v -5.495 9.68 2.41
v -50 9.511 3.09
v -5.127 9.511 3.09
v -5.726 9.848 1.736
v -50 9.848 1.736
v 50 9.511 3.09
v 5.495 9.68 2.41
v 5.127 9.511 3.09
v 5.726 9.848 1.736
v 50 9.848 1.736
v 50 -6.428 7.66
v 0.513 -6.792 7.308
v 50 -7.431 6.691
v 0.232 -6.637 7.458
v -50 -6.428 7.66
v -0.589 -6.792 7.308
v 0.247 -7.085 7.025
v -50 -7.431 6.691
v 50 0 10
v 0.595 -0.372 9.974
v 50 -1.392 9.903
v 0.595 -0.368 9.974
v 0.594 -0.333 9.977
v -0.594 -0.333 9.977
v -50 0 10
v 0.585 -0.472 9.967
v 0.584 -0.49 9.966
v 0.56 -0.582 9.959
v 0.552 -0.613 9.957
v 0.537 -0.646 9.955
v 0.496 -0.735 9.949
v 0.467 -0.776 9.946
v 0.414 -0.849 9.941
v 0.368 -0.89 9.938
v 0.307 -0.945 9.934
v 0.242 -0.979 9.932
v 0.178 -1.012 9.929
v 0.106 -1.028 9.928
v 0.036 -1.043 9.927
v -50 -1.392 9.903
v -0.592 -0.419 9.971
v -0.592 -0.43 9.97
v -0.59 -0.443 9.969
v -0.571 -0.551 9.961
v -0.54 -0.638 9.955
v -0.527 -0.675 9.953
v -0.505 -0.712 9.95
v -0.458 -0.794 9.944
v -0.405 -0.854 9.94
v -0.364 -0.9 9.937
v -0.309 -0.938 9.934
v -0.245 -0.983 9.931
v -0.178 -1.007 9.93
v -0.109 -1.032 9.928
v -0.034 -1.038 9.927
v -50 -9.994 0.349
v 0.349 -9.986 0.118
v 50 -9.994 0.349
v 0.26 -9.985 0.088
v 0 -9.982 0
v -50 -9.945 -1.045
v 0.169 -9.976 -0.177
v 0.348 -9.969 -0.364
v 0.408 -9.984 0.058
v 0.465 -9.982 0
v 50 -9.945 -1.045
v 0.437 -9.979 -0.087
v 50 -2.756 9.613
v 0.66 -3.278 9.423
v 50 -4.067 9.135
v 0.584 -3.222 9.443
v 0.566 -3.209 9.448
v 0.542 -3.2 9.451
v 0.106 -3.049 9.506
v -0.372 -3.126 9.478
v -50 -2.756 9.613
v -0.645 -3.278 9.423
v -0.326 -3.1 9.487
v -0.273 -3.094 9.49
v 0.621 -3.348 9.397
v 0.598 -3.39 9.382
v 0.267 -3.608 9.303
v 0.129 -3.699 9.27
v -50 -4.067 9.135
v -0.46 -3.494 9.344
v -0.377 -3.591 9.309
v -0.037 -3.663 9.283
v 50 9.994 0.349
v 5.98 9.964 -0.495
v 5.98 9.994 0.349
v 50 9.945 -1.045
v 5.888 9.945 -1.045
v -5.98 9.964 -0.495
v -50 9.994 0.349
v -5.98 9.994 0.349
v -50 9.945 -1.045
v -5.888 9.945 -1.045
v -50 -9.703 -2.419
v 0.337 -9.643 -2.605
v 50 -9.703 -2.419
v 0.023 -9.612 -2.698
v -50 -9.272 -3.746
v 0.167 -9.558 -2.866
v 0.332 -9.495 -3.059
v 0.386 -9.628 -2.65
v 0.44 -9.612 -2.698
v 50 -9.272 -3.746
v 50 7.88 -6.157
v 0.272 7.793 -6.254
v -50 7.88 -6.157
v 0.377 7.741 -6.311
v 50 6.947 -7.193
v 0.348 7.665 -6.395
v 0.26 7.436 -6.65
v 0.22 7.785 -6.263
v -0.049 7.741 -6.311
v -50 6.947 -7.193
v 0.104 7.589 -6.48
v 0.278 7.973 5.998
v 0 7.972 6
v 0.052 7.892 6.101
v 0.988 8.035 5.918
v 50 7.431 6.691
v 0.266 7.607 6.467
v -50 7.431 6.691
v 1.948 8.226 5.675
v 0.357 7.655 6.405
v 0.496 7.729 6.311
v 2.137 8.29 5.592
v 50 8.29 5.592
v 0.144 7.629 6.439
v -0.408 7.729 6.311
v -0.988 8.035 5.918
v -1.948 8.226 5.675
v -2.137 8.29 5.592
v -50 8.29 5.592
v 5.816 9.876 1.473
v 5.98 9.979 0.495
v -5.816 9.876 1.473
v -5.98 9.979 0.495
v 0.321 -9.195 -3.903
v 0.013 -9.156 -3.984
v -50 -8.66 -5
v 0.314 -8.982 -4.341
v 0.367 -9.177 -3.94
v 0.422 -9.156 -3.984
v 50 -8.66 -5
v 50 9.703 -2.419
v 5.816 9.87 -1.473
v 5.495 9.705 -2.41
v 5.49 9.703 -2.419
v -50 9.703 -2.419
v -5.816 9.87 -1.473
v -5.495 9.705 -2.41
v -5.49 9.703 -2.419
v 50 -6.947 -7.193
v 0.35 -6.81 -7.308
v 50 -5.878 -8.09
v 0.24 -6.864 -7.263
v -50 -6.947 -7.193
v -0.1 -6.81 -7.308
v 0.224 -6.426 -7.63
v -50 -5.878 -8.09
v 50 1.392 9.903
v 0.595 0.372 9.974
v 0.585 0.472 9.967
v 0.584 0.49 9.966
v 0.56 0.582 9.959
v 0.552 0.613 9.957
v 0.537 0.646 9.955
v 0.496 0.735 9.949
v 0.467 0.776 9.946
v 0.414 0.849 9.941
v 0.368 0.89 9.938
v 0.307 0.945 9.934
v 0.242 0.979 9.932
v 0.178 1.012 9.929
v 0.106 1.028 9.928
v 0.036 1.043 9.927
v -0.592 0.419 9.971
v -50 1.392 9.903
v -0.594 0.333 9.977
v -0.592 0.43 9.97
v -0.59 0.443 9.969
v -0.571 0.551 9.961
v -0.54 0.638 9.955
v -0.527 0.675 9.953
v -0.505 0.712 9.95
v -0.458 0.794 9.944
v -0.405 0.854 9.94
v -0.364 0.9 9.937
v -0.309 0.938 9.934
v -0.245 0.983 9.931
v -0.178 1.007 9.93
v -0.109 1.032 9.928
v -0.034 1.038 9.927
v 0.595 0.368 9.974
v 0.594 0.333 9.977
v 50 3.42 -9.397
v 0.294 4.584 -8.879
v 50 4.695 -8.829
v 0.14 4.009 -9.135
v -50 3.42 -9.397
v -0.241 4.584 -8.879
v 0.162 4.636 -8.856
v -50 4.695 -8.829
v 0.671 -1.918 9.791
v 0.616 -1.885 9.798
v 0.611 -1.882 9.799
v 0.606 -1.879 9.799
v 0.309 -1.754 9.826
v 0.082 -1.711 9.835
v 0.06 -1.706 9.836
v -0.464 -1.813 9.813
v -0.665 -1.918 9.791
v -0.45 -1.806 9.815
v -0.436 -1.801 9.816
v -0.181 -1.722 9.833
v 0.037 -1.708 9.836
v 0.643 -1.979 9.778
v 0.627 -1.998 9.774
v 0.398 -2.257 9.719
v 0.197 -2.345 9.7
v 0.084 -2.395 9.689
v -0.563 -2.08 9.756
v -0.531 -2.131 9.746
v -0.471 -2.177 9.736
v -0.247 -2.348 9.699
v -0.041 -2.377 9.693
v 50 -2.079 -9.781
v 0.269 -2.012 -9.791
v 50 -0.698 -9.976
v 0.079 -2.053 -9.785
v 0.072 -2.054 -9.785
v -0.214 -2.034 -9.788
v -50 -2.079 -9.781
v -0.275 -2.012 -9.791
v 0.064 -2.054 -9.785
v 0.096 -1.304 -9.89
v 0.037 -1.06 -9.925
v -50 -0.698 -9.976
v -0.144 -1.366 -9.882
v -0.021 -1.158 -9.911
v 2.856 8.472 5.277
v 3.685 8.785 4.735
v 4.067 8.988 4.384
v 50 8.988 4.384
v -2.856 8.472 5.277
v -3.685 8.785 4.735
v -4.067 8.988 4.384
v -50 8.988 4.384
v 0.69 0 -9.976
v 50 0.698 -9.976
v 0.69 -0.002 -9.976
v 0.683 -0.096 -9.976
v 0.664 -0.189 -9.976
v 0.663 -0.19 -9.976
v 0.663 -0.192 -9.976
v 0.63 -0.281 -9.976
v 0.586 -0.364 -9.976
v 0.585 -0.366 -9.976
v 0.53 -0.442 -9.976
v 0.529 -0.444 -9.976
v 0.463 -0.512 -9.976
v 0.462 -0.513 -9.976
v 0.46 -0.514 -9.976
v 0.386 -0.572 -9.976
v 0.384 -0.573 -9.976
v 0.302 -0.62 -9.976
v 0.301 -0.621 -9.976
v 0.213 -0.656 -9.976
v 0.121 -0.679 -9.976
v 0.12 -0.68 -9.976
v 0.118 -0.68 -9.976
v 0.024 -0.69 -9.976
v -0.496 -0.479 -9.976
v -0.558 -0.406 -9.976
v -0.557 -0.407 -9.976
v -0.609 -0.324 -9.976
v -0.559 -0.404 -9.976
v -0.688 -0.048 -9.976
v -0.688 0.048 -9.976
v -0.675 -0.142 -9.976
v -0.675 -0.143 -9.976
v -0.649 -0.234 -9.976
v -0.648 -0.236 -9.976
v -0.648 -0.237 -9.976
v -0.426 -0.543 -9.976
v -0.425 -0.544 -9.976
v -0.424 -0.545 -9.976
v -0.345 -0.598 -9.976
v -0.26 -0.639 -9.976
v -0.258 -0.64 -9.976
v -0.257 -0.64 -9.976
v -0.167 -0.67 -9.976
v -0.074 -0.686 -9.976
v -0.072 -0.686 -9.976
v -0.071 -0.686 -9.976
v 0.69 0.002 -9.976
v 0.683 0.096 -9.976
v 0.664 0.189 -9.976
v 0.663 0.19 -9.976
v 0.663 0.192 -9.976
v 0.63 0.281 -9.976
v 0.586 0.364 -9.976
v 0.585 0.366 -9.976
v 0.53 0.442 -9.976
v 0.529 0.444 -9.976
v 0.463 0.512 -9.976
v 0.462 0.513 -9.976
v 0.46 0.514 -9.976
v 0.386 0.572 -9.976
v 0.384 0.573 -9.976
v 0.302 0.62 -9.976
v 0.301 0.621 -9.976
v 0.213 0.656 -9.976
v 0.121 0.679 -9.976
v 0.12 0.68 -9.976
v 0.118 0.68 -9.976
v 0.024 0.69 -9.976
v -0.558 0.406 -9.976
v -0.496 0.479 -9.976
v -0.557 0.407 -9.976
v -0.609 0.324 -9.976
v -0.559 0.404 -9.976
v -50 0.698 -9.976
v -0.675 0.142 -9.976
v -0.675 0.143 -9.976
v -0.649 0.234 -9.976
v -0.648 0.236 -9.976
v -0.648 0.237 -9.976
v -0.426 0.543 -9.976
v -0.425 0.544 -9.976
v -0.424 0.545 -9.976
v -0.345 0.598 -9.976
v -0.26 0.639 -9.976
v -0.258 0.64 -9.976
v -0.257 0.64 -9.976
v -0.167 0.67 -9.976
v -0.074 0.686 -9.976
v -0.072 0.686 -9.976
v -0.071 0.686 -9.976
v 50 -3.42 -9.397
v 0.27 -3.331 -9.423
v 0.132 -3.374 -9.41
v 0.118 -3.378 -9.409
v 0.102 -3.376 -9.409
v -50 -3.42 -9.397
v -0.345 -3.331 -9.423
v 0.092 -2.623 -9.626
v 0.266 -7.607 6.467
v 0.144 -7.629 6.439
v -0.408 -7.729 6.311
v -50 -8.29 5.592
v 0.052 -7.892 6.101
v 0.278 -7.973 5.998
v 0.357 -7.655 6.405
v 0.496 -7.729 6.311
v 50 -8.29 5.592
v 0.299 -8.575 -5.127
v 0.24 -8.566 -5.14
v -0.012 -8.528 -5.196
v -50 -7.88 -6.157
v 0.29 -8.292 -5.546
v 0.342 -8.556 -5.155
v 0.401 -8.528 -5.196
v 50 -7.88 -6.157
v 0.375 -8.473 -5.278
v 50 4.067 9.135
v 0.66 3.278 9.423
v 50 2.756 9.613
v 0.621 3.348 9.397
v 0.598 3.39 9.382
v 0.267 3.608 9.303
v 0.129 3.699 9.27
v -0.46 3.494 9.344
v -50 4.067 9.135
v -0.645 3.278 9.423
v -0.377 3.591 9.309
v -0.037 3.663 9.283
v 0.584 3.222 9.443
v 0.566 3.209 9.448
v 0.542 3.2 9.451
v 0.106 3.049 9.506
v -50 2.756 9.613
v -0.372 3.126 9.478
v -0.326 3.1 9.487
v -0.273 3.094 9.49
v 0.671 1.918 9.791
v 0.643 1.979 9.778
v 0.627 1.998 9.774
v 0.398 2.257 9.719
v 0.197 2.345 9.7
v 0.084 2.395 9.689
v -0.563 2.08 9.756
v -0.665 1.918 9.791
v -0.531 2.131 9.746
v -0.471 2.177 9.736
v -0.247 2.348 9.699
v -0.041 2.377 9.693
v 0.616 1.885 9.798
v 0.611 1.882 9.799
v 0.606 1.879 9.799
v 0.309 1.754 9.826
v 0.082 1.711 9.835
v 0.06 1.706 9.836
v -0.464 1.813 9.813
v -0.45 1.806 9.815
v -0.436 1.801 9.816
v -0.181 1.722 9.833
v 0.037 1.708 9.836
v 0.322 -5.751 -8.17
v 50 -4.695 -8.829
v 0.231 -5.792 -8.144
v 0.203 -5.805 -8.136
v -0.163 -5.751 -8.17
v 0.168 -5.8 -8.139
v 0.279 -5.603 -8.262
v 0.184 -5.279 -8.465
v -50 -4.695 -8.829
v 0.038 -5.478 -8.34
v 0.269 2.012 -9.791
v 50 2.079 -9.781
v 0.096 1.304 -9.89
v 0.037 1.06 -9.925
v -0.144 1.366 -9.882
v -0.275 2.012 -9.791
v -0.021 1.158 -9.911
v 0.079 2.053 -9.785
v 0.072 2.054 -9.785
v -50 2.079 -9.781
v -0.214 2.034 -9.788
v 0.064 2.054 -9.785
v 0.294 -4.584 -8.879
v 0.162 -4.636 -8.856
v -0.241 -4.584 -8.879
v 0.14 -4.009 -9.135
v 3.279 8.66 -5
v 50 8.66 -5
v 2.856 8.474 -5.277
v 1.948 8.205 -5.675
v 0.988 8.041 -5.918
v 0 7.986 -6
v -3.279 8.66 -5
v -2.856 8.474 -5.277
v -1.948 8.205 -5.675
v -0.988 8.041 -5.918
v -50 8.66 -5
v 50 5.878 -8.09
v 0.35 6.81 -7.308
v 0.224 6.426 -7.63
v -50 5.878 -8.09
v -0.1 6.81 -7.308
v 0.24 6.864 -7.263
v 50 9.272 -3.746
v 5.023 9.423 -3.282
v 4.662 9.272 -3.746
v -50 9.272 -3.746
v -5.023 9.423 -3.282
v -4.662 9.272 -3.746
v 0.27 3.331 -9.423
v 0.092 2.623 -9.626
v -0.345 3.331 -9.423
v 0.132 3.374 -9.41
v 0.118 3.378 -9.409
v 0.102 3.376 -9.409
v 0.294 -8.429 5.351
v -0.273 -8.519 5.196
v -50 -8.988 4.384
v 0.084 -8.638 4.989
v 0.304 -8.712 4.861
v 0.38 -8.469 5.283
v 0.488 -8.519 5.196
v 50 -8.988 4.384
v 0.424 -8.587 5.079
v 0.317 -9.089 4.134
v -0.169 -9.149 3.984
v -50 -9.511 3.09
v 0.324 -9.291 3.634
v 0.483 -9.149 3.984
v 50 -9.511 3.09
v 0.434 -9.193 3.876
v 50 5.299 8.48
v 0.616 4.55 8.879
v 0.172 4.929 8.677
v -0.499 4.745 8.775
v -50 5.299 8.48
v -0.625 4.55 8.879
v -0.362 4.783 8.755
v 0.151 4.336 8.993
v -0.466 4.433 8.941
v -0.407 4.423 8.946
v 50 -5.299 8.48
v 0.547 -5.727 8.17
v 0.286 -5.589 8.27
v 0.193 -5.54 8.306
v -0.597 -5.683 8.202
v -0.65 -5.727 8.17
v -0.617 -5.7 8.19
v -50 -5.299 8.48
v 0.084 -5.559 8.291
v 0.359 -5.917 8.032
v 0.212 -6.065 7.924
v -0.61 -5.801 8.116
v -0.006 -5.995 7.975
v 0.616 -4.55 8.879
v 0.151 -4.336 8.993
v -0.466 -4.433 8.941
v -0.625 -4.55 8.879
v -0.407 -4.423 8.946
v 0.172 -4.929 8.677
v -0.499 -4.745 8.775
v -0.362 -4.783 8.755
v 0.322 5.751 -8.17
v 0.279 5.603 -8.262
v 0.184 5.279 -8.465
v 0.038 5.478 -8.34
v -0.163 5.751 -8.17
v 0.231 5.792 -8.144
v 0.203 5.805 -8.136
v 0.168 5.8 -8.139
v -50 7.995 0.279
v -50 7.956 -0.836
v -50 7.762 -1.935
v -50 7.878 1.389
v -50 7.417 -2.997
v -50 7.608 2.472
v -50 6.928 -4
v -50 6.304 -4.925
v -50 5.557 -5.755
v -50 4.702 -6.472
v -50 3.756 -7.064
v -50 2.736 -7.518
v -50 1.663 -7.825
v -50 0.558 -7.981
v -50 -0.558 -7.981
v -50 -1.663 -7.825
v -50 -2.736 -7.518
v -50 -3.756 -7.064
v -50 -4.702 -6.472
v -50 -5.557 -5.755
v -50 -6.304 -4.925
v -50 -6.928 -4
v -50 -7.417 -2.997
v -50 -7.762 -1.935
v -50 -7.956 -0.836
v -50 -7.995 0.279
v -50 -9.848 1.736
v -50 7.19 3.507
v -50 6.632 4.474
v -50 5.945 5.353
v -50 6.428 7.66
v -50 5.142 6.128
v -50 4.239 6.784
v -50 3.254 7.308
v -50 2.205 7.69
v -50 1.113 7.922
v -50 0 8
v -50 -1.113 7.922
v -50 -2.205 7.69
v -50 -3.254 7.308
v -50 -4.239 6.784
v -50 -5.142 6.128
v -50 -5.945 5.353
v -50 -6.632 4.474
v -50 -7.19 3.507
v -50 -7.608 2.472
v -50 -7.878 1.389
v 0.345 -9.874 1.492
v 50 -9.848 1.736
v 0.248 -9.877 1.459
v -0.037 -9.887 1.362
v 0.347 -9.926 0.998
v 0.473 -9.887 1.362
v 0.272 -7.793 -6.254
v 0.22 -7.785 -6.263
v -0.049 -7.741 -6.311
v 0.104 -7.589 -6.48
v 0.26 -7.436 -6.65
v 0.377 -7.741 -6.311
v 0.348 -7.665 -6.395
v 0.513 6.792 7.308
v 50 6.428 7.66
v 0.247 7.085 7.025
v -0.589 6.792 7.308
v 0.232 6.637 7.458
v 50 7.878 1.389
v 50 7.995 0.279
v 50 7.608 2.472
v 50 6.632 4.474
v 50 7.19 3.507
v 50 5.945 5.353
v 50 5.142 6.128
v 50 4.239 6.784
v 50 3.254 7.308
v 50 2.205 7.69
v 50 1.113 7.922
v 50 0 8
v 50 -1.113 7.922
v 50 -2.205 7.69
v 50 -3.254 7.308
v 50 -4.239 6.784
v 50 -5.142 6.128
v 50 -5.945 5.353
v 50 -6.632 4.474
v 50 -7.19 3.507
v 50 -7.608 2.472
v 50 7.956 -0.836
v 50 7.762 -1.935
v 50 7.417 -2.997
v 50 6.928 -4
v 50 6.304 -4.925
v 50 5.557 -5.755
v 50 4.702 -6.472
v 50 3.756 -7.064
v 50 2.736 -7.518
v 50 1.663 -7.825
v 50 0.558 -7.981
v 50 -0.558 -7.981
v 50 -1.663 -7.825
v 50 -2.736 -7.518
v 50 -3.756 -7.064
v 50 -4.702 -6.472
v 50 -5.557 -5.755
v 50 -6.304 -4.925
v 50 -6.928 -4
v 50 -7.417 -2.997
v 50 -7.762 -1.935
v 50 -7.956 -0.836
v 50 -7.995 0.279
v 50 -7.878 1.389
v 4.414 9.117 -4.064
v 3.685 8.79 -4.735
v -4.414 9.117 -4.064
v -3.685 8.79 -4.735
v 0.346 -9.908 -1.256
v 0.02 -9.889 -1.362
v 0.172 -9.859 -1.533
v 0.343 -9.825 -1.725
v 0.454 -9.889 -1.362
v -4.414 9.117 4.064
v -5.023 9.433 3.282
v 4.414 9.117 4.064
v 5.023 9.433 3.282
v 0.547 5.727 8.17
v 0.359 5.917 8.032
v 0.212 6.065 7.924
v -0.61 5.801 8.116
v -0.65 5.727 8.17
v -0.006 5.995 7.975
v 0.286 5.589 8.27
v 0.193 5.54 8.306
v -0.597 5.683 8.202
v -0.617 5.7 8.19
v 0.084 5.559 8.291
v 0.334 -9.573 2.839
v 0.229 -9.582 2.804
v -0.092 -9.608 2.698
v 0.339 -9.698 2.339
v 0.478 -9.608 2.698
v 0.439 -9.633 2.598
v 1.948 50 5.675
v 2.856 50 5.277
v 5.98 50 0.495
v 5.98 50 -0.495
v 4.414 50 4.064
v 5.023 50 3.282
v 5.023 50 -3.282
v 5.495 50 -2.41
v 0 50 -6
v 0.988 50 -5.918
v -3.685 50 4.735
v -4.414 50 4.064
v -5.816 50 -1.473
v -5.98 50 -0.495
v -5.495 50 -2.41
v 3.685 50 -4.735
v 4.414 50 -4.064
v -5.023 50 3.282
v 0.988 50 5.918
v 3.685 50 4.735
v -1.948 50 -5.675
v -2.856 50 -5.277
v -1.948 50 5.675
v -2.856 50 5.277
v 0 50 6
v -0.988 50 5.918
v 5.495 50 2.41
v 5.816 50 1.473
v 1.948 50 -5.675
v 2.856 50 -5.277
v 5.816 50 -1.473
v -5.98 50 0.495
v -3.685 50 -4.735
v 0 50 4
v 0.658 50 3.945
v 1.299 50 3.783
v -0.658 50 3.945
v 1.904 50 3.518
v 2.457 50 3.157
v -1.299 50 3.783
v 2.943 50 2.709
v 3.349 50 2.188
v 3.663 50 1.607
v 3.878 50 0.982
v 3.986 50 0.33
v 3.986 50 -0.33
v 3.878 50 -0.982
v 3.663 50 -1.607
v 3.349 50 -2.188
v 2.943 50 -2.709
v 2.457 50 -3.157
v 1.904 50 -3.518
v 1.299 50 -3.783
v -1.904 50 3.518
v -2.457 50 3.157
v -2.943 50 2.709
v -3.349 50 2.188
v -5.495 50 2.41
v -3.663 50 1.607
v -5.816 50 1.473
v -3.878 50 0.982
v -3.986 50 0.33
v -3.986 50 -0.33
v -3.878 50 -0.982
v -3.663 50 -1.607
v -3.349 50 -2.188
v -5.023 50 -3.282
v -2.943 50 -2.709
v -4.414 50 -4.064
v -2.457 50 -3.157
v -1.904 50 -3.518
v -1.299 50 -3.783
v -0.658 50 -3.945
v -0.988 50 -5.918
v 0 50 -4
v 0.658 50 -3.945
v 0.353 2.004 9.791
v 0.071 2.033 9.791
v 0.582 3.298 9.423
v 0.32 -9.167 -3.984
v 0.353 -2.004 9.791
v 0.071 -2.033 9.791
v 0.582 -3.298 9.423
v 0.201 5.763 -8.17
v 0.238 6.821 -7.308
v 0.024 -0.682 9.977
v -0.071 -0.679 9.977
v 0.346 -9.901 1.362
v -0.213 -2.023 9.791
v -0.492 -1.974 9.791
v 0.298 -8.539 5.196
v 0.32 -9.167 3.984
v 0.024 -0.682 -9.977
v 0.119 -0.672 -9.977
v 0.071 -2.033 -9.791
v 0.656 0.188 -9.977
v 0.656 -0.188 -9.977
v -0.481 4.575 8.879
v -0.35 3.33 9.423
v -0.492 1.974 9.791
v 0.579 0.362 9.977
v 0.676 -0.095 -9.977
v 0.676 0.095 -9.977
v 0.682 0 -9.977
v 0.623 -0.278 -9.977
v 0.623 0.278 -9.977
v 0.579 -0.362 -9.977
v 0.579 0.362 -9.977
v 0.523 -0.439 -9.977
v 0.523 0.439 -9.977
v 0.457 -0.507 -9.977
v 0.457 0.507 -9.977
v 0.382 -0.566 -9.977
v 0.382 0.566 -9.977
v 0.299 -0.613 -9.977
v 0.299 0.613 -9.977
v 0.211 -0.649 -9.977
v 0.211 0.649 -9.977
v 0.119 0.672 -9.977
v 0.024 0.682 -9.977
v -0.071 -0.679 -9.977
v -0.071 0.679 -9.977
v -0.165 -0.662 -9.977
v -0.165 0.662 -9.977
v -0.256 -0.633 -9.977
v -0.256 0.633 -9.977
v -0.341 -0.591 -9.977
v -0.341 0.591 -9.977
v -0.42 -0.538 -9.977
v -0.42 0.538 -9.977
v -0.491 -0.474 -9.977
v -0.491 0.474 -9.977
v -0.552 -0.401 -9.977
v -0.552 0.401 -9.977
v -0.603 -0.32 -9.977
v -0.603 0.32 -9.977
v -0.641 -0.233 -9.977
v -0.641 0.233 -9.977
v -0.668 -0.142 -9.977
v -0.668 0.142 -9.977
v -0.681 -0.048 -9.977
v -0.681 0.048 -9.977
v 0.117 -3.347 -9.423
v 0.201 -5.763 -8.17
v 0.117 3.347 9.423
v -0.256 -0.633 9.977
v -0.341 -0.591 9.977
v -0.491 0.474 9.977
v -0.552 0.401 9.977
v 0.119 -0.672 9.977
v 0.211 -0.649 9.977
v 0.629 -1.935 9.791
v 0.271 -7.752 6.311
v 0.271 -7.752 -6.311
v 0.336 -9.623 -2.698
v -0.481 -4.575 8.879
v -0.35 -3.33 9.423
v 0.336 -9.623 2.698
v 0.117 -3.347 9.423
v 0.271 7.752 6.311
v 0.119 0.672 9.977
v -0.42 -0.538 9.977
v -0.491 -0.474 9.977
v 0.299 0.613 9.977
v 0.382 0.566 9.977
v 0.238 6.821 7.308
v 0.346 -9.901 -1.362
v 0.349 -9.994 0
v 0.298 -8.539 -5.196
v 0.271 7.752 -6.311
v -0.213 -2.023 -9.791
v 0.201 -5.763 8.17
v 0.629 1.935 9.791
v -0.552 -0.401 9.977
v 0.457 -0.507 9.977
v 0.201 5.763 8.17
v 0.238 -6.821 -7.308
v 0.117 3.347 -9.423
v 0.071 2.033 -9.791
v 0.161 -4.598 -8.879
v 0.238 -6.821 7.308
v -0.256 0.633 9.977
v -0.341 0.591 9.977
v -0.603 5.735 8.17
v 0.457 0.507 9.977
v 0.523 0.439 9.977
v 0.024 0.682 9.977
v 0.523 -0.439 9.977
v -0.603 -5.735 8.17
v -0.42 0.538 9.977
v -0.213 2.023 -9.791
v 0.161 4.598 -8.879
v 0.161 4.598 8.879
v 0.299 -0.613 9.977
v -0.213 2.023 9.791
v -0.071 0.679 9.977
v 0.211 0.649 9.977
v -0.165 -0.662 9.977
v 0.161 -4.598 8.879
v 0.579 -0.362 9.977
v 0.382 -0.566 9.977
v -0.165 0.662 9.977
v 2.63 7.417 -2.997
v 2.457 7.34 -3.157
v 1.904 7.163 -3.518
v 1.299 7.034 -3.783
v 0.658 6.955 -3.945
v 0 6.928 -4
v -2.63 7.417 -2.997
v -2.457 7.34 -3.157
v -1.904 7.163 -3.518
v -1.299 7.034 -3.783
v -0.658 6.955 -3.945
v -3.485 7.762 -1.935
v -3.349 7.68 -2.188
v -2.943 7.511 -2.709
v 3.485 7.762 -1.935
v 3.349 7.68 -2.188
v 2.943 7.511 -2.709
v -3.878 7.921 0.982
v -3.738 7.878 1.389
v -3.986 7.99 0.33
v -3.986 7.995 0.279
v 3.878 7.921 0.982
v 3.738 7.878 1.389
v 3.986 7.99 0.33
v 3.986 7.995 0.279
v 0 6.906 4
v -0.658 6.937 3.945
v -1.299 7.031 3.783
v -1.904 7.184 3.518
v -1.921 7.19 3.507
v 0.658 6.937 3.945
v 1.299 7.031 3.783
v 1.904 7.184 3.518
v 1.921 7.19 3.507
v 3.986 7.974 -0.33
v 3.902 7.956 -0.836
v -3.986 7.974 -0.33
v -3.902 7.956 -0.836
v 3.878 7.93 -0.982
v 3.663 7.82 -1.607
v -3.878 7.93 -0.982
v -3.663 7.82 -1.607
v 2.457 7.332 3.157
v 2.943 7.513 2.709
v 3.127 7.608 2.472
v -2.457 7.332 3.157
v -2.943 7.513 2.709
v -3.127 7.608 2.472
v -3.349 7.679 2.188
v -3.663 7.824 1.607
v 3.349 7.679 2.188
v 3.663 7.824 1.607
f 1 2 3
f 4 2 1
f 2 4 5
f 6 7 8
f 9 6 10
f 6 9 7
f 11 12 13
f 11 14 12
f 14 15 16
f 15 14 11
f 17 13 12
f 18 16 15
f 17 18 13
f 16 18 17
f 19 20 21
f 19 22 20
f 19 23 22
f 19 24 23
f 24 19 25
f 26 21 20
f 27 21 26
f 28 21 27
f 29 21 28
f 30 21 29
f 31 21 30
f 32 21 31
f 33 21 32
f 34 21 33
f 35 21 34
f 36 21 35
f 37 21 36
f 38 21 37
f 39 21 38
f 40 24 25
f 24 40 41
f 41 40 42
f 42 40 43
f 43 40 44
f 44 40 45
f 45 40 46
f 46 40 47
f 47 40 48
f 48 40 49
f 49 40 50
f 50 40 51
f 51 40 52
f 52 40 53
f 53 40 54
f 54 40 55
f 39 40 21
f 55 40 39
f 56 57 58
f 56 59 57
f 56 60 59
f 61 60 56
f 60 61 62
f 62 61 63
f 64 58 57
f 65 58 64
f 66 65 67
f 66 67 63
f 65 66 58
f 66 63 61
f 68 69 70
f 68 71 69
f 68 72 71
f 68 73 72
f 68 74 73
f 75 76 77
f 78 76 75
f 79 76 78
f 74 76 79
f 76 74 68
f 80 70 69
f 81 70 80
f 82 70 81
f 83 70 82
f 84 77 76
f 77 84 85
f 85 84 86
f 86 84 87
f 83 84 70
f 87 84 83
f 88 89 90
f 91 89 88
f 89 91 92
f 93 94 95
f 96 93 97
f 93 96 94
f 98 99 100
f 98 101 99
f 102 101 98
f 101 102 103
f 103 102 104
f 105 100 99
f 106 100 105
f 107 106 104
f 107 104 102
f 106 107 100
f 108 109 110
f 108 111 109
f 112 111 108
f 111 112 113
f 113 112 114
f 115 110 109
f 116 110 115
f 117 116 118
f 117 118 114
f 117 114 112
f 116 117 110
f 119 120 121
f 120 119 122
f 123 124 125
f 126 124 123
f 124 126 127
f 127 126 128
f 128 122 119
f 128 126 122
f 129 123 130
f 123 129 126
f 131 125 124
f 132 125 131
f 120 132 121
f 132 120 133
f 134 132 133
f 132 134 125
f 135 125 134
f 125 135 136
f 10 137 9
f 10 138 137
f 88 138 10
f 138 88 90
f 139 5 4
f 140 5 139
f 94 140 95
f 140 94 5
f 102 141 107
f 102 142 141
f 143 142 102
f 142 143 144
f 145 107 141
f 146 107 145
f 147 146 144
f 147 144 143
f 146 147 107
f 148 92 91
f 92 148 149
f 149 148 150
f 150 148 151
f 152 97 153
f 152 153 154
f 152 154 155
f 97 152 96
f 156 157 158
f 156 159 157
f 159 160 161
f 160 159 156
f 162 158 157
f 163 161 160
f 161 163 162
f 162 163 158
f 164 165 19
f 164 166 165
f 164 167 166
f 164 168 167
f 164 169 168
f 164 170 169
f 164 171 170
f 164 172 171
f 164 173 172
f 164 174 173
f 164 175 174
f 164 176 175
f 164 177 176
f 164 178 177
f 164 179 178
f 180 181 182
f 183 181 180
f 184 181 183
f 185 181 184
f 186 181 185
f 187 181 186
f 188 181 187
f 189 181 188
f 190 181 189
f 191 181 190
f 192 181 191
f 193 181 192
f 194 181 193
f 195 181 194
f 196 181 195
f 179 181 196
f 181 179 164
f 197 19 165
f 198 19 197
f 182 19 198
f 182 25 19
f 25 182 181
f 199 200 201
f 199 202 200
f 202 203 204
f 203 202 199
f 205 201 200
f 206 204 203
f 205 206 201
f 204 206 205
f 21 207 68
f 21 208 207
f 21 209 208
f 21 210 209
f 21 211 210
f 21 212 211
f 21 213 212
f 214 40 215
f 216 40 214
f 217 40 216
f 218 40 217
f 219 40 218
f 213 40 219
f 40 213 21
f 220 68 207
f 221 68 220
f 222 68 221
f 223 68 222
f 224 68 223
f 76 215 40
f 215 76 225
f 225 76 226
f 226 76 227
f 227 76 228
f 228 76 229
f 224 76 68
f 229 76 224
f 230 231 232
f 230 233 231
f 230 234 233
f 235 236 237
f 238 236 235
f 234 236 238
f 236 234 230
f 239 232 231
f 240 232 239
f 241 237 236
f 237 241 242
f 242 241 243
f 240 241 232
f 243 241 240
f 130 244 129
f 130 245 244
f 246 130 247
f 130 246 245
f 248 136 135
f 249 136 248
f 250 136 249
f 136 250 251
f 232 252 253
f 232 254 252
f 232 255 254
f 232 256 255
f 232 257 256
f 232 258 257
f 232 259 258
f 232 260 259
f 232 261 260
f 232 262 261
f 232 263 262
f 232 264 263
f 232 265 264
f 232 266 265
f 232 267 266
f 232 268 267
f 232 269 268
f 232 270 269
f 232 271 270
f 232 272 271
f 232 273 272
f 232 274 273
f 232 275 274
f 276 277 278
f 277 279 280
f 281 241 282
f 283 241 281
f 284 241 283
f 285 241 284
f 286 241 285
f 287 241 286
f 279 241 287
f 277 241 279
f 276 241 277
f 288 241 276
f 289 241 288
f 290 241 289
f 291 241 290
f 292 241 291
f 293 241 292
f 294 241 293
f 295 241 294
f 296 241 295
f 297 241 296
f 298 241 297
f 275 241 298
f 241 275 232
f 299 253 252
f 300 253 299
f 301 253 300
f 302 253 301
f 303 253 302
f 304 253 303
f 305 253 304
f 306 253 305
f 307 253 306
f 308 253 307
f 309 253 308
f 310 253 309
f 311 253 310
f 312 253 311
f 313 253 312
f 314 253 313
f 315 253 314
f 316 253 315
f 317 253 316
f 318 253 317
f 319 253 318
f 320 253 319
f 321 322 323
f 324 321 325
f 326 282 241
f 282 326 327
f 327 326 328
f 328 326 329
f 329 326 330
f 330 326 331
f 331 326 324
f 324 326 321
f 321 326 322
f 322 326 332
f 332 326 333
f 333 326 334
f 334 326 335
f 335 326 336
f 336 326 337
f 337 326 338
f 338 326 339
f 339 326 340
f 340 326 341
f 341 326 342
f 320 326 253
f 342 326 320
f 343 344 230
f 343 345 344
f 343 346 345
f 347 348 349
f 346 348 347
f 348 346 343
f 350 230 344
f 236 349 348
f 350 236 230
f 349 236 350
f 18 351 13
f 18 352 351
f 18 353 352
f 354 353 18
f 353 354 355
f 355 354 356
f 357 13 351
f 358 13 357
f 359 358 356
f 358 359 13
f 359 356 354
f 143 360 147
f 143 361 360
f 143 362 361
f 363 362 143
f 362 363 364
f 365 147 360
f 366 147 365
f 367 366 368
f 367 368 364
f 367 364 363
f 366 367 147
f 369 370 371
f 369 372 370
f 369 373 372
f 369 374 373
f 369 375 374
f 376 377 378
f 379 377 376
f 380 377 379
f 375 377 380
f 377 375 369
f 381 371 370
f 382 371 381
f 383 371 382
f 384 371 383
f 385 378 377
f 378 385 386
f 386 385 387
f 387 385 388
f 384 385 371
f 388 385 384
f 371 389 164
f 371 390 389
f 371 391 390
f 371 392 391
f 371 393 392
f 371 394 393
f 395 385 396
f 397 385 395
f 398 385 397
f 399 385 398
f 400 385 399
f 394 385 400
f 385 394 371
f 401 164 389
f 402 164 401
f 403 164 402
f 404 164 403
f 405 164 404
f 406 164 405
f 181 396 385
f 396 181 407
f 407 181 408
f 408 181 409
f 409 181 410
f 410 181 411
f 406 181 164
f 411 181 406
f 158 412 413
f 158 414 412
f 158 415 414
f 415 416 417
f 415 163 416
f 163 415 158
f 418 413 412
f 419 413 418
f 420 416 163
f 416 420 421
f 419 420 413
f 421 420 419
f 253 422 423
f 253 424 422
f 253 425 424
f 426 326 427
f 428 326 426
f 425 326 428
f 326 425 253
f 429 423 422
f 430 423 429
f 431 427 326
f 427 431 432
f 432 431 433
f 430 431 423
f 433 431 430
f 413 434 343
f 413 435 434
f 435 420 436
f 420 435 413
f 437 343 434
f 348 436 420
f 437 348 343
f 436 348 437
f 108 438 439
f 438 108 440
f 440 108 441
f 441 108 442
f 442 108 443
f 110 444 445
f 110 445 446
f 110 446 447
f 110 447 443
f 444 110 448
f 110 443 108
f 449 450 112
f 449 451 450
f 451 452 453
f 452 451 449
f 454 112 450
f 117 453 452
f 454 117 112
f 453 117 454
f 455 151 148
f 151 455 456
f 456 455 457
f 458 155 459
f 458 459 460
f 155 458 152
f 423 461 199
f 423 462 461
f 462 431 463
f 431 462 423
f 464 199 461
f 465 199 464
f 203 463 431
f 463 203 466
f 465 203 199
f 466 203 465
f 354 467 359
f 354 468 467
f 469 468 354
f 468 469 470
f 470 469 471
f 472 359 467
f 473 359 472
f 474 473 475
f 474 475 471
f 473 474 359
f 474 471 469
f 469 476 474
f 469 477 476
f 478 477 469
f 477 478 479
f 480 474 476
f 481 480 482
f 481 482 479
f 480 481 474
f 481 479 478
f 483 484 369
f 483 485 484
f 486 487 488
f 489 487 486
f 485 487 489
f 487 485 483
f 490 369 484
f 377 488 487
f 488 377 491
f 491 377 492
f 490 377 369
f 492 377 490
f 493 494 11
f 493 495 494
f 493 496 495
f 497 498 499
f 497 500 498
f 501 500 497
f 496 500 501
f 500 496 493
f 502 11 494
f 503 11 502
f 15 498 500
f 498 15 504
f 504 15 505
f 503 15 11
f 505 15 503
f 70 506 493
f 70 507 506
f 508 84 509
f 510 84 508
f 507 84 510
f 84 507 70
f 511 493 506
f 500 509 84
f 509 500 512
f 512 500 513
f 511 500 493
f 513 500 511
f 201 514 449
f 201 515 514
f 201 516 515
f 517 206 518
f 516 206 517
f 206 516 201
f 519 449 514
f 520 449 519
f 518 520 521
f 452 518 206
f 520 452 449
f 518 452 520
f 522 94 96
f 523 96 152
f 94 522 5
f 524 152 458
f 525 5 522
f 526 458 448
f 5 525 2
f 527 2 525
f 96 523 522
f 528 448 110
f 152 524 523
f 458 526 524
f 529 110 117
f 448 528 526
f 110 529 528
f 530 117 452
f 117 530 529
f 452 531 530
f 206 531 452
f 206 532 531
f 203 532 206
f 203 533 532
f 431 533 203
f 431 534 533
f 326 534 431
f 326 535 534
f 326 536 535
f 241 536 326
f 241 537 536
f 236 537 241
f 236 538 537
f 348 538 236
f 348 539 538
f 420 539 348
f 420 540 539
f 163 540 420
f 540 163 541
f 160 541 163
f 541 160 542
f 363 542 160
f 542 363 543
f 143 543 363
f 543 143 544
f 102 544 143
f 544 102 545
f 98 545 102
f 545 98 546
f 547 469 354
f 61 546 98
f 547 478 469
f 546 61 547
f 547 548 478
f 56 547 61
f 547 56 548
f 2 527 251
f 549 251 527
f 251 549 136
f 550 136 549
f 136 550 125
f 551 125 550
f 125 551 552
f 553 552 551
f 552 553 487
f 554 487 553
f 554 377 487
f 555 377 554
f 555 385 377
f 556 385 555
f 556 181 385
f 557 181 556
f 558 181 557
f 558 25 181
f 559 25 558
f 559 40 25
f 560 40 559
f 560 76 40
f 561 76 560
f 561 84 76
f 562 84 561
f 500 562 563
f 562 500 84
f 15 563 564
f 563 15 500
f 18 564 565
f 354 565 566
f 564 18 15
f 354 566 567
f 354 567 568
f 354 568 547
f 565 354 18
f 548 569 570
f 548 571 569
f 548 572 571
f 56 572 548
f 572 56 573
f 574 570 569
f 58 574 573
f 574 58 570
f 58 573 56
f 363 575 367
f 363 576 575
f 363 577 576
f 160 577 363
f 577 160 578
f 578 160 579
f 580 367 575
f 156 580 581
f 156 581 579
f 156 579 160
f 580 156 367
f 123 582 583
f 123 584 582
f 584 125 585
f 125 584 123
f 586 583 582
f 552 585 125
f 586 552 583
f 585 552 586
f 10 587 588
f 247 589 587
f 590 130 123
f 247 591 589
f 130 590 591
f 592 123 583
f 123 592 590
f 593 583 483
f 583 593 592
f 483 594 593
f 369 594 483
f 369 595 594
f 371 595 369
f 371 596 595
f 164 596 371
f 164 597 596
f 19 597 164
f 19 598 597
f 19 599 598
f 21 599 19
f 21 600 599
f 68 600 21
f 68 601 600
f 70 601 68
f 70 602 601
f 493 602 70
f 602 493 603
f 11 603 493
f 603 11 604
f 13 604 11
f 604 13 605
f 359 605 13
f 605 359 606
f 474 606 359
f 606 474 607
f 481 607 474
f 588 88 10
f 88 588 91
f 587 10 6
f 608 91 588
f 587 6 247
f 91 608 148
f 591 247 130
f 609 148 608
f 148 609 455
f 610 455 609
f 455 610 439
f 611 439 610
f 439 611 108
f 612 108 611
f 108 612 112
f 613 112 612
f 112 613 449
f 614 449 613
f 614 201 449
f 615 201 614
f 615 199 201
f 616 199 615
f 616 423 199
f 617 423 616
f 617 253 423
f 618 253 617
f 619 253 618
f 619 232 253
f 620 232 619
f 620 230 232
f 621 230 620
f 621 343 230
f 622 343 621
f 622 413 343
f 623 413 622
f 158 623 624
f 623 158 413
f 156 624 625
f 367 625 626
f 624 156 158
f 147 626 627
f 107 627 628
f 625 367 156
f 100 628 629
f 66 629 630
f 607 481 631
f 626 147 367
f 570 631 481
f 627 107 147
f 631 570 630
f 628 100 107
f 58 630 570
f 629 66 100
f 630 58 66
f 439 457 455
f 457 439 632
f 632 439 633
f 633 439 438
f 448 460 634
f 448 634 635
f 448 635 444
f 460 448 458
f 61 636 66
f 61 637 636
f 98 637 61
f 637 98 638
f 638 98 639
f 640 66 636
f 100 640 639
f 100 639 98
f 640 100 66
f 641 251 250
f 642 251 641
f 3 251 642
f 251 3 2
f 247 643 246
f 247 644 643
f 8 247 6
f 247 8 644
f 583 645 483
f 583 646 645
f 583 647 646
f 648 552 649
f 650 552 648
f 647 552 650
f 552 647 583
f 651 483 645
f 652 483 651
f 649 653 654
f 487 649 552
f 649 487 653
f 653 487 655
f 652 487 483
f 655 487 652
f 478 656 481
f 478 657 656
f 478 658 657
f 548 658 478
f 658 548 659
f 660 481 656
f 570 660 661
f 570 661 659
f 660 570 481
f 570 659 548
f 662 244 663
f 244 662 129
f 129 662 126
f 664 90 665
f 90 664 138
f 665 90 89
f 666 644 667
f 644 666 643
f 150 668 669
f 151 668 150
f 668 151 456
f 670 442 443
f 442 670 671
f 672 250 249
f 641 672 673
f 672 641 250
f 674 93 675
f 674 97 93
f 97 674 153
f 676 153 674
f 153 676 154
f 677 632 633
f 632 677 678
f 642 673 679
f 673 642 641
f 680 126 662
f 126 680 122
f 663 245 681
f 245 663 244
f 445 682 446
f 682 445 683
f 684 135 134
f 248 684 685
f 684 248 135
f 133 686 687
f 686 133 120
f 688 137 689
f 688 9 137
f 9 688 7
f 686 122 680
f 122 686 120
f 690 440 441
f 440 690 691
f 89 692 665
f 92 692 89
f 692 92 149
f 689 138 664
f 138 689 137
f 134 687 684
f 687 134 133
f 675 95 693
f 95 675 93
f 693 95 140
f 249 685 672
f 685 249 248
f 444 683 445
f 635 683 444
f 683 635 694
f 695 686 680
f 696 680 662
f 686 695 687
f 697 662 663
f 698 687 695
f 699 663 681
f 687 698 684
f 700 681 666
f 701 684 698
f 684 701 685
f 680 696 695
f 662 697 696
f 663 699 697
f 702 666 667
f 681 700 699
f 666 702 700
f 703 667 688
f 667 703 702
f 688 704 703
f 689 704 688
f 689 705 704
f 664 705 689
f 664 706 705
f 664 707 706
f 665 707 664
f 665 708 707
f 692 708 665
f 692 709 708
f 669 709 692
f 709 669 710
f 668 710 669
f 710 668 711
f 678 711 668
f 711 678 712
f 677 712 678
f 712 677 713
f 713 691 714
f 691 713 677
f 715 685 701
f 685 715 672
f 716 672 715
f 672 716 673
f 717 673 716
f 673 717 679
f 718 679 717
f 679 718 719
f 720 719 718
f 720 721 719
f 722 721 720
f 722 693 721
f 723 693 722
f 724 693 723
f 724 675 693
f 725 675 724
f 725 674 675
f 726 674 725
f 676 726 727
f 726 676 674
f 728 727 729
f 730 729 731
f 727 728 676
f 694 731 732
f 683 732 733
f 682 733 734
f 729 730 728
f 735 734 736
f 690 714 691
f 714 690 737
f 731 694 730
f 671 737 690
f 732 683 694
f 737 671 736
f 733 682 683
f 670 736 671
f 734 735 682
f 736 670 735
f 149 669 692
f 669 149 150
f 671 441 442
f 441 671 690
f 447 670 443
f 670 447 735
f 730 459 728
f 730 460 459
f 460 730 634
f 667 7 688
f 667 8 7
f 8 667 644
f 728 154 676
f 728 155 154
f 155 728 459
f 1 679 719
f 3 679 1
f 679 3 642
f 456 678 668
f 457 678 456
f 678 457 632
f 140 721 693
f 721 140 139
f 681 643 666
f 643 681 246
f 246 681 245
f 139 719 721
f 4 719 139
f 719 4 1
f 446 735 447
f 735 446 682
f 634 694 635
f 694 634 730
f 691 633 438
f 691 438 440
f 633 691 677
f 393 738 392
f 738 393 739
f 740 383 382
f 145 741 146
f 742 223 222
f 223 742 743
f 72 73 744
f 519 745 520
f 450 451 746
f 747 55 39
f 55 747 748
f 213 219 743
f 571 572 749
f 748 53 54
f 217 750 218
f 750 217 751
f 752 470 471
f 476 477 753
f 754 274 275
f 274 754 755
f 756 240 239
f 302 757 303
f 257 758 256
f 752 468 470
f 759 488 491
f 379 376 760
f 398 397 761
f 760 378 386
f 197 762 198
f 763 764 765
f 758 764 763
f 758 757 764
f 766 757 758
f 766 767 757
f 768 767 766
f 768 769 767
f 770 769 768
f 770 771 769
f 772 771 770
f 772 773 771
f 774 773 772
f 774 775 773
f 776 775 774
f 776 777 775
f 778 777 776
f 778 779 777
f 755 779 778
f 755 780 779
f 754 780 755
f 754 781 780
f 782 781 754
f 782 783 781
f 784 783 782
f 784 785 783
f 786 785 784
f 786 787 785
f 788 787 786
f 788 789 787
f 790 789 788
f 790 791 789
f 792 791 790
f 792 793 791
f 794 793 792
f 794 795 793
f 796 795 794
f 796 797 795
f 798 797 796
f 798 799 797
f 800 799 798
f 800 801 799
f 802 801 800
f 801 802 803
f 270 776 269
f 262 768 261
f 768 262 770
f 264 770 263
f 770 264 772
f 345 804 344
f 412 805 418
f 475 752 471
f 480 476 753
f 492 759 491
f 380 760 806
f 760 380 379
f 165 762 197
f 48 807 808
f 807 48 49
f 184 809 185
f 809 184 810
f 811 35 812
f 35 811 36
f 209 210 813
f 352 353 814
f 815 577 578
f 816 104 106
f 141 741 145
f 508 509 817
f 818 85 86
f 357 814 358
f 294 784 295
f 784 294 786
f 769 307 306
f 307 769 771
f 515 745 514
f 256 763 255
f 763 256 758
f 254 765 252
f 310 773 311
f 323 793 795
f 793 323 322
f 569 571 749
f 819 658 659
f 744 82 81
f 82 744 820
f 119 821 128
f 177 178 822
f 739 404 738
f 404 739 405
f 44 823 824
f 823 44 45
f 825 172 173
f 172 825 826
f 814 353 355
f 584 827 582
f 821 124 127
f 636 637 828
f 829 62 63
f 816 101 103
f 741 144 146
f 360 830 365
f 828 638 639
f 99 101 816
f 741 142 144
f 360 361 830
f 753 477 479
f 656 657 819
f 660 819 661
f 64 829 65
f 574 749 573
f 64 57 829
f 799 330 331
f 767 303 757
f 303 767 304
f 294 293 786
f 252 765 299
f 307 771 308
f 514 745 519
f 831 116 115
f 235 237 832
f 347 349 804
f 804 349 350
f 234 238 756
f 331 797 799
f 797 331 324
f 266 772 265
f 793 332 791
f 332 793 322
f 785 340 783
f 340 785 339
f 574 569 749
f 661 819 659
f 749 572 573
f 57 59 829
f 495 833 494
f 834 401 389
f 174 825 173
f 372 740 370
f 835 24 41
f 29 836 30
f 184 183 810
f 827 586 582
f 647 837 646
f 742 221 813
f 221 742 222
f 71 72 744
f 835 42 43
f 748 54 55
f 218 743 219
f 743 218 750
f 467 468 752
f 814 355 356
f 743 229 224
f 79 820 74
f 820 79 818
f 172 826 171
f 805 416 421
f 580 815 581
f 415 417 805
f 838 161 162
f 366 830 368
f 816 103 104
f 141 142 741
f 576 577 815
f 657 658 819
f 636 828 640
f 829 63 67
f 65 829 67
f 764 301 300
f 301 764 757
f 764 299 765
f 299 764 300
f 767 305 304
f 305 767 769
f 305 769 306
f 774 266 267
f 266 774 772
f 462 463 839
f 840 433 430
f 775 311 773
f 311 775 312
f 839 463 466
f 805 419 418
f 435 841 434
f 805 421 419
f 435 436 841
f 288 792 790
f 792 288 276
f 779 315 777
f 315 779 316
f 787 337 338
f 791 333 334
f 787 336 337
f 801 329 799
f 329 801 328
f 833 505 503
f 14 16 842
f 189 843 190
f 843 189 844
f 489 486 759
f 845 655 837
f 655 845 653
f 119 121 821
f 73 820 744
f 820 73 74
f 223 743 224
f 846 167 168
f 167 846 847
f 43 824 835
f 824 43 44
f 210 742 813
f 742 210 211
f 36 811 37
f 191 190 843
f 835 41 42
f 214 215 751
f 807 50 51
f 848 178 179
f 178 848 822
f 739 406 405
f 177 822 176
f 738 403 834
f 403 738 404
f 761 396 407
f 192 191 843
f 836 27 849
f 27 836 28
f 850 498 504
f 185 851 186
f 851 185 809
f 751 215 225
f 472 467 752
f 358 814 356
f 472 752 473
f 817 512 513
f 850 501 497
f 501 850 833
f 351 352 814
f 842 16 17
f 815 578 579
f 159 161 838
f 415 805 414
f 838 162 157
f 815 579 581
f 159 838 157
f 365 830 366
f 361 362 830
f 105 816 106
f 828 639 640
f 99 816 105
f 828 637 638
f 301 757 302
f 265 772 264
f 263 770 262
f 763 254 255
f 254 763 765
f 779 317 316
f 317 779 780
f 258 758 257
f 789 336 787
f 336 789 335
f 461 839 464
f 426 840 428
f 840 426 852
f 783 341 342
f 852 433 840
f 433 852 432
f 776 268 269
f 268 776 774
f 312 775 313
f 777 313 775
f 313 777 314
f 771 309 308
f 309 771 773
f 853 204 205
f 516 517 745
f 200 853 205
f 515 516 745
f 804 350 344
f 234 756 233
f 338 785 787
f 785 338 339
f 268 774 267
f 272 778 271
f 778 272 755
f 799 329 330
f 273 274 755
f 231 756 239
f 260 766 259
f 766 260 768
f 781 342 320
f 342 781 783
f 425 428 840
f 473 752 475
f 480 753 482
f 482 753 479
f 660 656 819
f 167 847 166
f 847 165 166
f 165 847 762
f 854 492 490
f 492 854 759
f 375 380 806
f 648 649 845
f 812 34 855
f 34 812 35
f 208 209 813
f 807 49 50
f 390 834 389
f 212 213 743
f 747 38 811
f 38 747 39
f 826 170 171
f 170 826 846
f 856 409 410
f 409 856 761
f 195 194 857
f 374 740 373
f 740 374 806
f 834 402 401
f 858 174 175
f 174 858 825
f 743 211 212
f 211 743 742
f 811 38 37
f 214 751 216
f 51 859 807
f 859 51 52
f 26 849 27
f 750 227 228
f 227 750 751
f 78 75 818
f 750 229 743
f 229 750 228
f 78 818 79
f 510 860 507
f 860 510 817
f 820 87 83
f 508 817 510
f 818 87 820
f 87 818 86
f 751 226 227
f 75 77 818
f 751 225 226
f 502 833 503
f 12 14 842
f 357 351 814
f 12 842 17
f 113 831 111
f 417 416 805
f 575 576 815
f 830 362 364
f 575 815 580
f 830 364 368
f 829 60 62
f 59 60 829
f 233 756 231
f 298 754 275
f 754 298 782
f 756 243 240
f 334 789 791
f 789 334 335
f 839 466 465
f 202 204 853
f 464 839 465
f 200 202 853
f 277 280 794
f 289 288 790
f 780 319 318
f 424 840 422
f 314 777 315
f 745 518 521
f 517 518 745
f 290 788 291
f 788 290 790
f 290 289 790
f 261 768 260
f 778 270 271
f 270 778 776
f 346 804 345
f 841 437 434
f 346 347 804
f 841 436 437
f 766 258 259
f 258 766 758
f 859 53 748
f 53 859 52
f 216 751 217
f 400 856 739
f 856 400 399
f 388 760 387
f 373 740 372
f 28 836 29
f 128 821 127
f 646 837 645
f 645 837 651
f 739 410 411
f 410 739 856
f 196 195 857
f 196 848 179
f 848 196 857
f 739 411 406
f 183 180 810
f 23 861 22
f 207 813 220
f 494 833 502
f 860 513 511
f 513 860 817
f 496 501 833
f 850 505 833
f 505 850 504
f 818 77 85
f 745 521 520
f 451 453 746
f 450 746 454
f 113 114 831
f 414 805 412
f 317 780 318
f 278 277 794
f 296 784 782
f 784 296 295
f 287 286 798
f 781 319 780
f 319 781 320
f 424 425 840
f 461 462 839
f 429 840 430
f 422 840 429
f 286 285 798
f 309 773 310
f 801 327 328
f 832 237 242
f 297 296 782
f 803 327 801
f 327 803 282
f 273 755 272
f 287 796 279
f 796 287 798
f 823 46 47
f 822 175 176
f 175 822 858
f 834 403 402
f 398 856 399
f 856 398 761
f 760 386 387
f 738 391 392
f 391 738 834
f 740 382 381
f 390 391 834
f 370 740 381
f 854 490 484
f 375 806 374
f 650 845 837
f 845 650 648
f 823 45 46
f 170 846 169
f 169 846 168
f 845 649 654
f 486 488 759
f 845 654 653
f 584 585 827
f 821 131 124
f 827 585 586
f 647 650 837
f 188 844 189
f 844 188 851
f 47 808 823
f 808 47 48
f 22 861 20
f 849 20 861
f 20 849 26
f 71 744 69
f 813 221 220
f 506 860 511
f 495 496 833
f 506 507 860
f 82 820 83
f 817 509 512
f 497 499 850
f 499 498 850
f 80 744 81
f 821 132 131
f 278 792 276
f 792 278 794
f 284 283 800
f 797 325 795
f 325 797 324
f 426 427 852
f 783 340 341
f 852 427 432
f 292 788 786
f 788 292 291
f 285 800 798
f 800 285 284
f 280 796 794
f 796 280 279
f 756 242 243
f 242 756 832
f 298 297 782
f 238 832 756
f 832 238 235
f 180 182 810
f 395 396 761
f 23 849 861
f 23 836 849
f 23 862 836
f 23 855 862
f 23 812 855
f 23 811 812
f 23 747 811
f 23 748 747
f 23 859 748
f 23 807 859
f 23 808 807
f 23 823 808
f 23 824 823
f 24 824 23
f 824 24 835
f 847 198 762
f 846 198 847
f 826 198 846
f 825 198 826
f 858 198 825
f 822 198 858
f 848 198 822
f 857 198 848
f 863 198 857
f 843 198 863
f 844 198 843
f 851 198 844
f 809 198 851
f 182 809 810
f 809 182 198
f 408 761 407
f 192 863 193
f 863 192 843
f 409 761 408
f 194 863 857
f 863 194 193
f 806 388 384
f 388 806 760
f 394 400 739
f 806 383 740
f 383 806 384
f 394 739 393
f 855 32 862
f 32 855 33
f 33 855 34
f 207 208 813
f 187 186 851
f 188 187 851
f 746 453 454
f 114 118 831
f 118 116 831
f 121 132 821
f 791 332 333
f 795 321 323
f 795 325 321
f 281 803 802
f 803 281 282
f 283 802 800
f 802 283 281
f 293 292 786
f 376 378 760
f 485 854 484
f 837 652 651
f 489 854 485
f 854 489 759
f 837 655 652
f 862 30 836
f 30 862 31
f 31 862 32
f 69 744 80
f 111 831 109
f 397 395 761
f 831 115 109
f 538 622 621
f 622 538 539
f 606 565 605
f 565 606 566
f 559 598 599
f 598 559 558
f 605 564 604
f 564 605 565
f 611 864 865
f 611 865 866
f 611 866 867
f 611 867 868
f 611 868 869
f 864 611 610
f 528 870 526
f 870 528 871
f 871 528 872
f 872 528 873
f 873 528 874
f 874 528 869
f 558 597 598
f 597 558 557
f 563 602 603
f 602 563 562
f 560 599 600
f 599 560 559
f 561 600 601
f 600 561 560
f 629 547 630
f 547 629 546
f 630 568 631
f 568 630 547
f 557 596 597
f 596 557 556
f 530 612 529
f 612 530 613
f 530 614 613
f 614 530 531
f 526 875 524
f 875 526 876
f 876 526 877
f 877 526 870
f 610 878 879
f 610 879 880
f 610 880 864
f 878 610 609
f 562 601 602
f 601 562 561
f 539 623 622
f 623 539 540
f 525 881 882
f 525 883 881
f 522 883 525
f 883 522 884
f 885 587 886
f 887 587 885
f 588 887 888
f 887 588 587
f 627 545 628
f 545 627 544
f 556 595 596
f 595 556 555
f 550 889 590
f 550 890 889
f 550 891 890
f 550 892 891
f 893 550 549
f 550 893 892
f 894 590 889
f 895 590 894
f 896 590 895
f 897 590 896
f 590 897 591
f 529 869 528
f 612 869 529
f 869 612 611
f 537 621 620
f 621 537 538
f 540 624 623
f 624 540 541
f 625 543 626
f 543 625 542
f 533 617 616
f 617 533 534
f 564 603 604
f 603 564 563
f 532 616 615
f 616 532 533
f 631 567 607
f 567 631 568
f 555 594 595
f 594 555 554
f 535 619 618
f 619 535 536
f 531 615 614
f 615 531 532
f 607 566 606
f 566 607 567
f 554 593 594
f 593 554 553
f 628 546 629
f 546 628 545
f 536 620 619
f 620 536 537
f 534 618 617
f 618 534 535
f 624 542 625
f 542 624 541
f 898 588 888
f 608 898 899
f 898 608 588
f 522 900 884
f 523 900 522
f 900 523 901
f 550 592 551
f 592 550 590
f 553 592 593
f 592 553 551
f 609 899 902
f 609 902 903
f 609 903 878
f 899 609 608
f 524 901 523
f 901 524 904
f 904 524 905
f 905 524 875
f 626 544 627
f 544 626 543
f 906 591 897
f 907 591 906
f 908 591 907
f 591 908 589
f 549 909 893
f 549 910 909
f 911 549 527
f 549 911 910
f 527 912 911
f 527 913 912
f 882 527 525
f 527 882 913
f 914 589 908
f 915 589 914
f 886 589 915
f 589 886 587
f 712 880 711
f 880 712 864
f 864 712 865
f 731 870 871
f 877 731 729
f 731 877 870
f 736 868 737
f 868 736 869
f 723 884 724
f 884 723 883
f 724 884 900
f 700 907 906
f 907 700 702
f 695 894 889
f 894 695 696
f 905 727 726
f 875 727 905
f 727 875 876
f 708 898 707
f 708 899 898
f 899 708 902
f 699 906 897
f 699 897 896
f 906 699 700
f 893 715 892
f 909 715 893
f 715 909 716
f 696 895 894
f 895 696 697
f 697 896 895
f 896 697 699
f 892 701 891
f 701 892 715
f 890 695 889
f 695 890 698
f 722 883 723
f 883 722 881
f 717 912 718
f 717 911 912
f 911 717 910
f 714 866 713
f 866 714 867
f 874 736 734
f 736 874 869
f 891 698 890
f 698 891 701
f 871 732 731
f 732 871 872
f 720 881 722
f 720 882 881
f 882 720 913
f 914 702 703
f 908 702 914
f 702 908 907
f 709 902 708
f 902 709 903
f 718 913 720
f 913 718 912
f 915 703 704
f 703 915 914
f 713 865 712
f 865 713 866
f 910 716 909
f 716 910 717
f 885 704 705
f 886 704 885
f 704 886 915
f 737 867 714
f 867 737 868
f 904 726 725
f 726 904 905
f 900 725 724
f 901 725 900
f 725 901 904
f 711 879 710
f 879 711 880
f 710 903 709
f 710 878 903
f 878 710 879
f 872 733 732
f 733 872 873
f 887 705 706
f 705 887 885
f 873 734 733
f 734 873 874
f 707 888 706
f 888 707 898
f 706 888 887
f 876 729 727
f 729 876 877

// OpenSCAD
// A tee landing on a wall
// A branch drawn from the trunk's outer wall, joined mid-run.

// 10_tee_wall_landing — the junction case that breaks the naive construction.
//
// The branch starts on the trunk's outer WALL, not on its axis. That is how
// every real tee is described, and how reference/doommeister/'s own middle_tee_n
// is parameterised -- and in design review it produced a 0.95 mm PLUG across the
// branch lumen while CGAL reported `Simple: yes, Volumes: 2` and a naive
// manifoldness regression test PASSED.
//
// Two things fix it, and neither is a global epsilon:
//   * the joint is DECLARED, with a mid-run landing ["s", 50] on the trunk, so
//     the assembler knows the node is on the trunk CENTRELINE;
//   * both the shell AND the bore are extended from the branch end to that node.
//     Extending only the bore leaves the shells touching tangentially -- measured
//     `Simple: yes, Volumes: 3`, two solids sharing a circle.

use <../src/uniTube.scad>;

$fa = 8;
$fs = 1;

module part()
{
    trunk = ut_run("trunk", ut_polyline([ [ -50, 0, 0 ], [ 50, 0, 0 ] ]), ut_round(od = 20, wall = 2));
    // Starts at y = 10, exactly on the trunk's outer surface.
    branch = ut_run("branch", ut_polyline([ [ 0, 10, 0 ], [ 0, 50, 0 ] ]), ut_round(od = 12, wall = 2));

    ut_assemble(ut_net([ trunk, branch ], [ut_joint([ [ "trunk", [ "s", 50 ] ], [ "branch", "a" ] ])]));
}

part();
